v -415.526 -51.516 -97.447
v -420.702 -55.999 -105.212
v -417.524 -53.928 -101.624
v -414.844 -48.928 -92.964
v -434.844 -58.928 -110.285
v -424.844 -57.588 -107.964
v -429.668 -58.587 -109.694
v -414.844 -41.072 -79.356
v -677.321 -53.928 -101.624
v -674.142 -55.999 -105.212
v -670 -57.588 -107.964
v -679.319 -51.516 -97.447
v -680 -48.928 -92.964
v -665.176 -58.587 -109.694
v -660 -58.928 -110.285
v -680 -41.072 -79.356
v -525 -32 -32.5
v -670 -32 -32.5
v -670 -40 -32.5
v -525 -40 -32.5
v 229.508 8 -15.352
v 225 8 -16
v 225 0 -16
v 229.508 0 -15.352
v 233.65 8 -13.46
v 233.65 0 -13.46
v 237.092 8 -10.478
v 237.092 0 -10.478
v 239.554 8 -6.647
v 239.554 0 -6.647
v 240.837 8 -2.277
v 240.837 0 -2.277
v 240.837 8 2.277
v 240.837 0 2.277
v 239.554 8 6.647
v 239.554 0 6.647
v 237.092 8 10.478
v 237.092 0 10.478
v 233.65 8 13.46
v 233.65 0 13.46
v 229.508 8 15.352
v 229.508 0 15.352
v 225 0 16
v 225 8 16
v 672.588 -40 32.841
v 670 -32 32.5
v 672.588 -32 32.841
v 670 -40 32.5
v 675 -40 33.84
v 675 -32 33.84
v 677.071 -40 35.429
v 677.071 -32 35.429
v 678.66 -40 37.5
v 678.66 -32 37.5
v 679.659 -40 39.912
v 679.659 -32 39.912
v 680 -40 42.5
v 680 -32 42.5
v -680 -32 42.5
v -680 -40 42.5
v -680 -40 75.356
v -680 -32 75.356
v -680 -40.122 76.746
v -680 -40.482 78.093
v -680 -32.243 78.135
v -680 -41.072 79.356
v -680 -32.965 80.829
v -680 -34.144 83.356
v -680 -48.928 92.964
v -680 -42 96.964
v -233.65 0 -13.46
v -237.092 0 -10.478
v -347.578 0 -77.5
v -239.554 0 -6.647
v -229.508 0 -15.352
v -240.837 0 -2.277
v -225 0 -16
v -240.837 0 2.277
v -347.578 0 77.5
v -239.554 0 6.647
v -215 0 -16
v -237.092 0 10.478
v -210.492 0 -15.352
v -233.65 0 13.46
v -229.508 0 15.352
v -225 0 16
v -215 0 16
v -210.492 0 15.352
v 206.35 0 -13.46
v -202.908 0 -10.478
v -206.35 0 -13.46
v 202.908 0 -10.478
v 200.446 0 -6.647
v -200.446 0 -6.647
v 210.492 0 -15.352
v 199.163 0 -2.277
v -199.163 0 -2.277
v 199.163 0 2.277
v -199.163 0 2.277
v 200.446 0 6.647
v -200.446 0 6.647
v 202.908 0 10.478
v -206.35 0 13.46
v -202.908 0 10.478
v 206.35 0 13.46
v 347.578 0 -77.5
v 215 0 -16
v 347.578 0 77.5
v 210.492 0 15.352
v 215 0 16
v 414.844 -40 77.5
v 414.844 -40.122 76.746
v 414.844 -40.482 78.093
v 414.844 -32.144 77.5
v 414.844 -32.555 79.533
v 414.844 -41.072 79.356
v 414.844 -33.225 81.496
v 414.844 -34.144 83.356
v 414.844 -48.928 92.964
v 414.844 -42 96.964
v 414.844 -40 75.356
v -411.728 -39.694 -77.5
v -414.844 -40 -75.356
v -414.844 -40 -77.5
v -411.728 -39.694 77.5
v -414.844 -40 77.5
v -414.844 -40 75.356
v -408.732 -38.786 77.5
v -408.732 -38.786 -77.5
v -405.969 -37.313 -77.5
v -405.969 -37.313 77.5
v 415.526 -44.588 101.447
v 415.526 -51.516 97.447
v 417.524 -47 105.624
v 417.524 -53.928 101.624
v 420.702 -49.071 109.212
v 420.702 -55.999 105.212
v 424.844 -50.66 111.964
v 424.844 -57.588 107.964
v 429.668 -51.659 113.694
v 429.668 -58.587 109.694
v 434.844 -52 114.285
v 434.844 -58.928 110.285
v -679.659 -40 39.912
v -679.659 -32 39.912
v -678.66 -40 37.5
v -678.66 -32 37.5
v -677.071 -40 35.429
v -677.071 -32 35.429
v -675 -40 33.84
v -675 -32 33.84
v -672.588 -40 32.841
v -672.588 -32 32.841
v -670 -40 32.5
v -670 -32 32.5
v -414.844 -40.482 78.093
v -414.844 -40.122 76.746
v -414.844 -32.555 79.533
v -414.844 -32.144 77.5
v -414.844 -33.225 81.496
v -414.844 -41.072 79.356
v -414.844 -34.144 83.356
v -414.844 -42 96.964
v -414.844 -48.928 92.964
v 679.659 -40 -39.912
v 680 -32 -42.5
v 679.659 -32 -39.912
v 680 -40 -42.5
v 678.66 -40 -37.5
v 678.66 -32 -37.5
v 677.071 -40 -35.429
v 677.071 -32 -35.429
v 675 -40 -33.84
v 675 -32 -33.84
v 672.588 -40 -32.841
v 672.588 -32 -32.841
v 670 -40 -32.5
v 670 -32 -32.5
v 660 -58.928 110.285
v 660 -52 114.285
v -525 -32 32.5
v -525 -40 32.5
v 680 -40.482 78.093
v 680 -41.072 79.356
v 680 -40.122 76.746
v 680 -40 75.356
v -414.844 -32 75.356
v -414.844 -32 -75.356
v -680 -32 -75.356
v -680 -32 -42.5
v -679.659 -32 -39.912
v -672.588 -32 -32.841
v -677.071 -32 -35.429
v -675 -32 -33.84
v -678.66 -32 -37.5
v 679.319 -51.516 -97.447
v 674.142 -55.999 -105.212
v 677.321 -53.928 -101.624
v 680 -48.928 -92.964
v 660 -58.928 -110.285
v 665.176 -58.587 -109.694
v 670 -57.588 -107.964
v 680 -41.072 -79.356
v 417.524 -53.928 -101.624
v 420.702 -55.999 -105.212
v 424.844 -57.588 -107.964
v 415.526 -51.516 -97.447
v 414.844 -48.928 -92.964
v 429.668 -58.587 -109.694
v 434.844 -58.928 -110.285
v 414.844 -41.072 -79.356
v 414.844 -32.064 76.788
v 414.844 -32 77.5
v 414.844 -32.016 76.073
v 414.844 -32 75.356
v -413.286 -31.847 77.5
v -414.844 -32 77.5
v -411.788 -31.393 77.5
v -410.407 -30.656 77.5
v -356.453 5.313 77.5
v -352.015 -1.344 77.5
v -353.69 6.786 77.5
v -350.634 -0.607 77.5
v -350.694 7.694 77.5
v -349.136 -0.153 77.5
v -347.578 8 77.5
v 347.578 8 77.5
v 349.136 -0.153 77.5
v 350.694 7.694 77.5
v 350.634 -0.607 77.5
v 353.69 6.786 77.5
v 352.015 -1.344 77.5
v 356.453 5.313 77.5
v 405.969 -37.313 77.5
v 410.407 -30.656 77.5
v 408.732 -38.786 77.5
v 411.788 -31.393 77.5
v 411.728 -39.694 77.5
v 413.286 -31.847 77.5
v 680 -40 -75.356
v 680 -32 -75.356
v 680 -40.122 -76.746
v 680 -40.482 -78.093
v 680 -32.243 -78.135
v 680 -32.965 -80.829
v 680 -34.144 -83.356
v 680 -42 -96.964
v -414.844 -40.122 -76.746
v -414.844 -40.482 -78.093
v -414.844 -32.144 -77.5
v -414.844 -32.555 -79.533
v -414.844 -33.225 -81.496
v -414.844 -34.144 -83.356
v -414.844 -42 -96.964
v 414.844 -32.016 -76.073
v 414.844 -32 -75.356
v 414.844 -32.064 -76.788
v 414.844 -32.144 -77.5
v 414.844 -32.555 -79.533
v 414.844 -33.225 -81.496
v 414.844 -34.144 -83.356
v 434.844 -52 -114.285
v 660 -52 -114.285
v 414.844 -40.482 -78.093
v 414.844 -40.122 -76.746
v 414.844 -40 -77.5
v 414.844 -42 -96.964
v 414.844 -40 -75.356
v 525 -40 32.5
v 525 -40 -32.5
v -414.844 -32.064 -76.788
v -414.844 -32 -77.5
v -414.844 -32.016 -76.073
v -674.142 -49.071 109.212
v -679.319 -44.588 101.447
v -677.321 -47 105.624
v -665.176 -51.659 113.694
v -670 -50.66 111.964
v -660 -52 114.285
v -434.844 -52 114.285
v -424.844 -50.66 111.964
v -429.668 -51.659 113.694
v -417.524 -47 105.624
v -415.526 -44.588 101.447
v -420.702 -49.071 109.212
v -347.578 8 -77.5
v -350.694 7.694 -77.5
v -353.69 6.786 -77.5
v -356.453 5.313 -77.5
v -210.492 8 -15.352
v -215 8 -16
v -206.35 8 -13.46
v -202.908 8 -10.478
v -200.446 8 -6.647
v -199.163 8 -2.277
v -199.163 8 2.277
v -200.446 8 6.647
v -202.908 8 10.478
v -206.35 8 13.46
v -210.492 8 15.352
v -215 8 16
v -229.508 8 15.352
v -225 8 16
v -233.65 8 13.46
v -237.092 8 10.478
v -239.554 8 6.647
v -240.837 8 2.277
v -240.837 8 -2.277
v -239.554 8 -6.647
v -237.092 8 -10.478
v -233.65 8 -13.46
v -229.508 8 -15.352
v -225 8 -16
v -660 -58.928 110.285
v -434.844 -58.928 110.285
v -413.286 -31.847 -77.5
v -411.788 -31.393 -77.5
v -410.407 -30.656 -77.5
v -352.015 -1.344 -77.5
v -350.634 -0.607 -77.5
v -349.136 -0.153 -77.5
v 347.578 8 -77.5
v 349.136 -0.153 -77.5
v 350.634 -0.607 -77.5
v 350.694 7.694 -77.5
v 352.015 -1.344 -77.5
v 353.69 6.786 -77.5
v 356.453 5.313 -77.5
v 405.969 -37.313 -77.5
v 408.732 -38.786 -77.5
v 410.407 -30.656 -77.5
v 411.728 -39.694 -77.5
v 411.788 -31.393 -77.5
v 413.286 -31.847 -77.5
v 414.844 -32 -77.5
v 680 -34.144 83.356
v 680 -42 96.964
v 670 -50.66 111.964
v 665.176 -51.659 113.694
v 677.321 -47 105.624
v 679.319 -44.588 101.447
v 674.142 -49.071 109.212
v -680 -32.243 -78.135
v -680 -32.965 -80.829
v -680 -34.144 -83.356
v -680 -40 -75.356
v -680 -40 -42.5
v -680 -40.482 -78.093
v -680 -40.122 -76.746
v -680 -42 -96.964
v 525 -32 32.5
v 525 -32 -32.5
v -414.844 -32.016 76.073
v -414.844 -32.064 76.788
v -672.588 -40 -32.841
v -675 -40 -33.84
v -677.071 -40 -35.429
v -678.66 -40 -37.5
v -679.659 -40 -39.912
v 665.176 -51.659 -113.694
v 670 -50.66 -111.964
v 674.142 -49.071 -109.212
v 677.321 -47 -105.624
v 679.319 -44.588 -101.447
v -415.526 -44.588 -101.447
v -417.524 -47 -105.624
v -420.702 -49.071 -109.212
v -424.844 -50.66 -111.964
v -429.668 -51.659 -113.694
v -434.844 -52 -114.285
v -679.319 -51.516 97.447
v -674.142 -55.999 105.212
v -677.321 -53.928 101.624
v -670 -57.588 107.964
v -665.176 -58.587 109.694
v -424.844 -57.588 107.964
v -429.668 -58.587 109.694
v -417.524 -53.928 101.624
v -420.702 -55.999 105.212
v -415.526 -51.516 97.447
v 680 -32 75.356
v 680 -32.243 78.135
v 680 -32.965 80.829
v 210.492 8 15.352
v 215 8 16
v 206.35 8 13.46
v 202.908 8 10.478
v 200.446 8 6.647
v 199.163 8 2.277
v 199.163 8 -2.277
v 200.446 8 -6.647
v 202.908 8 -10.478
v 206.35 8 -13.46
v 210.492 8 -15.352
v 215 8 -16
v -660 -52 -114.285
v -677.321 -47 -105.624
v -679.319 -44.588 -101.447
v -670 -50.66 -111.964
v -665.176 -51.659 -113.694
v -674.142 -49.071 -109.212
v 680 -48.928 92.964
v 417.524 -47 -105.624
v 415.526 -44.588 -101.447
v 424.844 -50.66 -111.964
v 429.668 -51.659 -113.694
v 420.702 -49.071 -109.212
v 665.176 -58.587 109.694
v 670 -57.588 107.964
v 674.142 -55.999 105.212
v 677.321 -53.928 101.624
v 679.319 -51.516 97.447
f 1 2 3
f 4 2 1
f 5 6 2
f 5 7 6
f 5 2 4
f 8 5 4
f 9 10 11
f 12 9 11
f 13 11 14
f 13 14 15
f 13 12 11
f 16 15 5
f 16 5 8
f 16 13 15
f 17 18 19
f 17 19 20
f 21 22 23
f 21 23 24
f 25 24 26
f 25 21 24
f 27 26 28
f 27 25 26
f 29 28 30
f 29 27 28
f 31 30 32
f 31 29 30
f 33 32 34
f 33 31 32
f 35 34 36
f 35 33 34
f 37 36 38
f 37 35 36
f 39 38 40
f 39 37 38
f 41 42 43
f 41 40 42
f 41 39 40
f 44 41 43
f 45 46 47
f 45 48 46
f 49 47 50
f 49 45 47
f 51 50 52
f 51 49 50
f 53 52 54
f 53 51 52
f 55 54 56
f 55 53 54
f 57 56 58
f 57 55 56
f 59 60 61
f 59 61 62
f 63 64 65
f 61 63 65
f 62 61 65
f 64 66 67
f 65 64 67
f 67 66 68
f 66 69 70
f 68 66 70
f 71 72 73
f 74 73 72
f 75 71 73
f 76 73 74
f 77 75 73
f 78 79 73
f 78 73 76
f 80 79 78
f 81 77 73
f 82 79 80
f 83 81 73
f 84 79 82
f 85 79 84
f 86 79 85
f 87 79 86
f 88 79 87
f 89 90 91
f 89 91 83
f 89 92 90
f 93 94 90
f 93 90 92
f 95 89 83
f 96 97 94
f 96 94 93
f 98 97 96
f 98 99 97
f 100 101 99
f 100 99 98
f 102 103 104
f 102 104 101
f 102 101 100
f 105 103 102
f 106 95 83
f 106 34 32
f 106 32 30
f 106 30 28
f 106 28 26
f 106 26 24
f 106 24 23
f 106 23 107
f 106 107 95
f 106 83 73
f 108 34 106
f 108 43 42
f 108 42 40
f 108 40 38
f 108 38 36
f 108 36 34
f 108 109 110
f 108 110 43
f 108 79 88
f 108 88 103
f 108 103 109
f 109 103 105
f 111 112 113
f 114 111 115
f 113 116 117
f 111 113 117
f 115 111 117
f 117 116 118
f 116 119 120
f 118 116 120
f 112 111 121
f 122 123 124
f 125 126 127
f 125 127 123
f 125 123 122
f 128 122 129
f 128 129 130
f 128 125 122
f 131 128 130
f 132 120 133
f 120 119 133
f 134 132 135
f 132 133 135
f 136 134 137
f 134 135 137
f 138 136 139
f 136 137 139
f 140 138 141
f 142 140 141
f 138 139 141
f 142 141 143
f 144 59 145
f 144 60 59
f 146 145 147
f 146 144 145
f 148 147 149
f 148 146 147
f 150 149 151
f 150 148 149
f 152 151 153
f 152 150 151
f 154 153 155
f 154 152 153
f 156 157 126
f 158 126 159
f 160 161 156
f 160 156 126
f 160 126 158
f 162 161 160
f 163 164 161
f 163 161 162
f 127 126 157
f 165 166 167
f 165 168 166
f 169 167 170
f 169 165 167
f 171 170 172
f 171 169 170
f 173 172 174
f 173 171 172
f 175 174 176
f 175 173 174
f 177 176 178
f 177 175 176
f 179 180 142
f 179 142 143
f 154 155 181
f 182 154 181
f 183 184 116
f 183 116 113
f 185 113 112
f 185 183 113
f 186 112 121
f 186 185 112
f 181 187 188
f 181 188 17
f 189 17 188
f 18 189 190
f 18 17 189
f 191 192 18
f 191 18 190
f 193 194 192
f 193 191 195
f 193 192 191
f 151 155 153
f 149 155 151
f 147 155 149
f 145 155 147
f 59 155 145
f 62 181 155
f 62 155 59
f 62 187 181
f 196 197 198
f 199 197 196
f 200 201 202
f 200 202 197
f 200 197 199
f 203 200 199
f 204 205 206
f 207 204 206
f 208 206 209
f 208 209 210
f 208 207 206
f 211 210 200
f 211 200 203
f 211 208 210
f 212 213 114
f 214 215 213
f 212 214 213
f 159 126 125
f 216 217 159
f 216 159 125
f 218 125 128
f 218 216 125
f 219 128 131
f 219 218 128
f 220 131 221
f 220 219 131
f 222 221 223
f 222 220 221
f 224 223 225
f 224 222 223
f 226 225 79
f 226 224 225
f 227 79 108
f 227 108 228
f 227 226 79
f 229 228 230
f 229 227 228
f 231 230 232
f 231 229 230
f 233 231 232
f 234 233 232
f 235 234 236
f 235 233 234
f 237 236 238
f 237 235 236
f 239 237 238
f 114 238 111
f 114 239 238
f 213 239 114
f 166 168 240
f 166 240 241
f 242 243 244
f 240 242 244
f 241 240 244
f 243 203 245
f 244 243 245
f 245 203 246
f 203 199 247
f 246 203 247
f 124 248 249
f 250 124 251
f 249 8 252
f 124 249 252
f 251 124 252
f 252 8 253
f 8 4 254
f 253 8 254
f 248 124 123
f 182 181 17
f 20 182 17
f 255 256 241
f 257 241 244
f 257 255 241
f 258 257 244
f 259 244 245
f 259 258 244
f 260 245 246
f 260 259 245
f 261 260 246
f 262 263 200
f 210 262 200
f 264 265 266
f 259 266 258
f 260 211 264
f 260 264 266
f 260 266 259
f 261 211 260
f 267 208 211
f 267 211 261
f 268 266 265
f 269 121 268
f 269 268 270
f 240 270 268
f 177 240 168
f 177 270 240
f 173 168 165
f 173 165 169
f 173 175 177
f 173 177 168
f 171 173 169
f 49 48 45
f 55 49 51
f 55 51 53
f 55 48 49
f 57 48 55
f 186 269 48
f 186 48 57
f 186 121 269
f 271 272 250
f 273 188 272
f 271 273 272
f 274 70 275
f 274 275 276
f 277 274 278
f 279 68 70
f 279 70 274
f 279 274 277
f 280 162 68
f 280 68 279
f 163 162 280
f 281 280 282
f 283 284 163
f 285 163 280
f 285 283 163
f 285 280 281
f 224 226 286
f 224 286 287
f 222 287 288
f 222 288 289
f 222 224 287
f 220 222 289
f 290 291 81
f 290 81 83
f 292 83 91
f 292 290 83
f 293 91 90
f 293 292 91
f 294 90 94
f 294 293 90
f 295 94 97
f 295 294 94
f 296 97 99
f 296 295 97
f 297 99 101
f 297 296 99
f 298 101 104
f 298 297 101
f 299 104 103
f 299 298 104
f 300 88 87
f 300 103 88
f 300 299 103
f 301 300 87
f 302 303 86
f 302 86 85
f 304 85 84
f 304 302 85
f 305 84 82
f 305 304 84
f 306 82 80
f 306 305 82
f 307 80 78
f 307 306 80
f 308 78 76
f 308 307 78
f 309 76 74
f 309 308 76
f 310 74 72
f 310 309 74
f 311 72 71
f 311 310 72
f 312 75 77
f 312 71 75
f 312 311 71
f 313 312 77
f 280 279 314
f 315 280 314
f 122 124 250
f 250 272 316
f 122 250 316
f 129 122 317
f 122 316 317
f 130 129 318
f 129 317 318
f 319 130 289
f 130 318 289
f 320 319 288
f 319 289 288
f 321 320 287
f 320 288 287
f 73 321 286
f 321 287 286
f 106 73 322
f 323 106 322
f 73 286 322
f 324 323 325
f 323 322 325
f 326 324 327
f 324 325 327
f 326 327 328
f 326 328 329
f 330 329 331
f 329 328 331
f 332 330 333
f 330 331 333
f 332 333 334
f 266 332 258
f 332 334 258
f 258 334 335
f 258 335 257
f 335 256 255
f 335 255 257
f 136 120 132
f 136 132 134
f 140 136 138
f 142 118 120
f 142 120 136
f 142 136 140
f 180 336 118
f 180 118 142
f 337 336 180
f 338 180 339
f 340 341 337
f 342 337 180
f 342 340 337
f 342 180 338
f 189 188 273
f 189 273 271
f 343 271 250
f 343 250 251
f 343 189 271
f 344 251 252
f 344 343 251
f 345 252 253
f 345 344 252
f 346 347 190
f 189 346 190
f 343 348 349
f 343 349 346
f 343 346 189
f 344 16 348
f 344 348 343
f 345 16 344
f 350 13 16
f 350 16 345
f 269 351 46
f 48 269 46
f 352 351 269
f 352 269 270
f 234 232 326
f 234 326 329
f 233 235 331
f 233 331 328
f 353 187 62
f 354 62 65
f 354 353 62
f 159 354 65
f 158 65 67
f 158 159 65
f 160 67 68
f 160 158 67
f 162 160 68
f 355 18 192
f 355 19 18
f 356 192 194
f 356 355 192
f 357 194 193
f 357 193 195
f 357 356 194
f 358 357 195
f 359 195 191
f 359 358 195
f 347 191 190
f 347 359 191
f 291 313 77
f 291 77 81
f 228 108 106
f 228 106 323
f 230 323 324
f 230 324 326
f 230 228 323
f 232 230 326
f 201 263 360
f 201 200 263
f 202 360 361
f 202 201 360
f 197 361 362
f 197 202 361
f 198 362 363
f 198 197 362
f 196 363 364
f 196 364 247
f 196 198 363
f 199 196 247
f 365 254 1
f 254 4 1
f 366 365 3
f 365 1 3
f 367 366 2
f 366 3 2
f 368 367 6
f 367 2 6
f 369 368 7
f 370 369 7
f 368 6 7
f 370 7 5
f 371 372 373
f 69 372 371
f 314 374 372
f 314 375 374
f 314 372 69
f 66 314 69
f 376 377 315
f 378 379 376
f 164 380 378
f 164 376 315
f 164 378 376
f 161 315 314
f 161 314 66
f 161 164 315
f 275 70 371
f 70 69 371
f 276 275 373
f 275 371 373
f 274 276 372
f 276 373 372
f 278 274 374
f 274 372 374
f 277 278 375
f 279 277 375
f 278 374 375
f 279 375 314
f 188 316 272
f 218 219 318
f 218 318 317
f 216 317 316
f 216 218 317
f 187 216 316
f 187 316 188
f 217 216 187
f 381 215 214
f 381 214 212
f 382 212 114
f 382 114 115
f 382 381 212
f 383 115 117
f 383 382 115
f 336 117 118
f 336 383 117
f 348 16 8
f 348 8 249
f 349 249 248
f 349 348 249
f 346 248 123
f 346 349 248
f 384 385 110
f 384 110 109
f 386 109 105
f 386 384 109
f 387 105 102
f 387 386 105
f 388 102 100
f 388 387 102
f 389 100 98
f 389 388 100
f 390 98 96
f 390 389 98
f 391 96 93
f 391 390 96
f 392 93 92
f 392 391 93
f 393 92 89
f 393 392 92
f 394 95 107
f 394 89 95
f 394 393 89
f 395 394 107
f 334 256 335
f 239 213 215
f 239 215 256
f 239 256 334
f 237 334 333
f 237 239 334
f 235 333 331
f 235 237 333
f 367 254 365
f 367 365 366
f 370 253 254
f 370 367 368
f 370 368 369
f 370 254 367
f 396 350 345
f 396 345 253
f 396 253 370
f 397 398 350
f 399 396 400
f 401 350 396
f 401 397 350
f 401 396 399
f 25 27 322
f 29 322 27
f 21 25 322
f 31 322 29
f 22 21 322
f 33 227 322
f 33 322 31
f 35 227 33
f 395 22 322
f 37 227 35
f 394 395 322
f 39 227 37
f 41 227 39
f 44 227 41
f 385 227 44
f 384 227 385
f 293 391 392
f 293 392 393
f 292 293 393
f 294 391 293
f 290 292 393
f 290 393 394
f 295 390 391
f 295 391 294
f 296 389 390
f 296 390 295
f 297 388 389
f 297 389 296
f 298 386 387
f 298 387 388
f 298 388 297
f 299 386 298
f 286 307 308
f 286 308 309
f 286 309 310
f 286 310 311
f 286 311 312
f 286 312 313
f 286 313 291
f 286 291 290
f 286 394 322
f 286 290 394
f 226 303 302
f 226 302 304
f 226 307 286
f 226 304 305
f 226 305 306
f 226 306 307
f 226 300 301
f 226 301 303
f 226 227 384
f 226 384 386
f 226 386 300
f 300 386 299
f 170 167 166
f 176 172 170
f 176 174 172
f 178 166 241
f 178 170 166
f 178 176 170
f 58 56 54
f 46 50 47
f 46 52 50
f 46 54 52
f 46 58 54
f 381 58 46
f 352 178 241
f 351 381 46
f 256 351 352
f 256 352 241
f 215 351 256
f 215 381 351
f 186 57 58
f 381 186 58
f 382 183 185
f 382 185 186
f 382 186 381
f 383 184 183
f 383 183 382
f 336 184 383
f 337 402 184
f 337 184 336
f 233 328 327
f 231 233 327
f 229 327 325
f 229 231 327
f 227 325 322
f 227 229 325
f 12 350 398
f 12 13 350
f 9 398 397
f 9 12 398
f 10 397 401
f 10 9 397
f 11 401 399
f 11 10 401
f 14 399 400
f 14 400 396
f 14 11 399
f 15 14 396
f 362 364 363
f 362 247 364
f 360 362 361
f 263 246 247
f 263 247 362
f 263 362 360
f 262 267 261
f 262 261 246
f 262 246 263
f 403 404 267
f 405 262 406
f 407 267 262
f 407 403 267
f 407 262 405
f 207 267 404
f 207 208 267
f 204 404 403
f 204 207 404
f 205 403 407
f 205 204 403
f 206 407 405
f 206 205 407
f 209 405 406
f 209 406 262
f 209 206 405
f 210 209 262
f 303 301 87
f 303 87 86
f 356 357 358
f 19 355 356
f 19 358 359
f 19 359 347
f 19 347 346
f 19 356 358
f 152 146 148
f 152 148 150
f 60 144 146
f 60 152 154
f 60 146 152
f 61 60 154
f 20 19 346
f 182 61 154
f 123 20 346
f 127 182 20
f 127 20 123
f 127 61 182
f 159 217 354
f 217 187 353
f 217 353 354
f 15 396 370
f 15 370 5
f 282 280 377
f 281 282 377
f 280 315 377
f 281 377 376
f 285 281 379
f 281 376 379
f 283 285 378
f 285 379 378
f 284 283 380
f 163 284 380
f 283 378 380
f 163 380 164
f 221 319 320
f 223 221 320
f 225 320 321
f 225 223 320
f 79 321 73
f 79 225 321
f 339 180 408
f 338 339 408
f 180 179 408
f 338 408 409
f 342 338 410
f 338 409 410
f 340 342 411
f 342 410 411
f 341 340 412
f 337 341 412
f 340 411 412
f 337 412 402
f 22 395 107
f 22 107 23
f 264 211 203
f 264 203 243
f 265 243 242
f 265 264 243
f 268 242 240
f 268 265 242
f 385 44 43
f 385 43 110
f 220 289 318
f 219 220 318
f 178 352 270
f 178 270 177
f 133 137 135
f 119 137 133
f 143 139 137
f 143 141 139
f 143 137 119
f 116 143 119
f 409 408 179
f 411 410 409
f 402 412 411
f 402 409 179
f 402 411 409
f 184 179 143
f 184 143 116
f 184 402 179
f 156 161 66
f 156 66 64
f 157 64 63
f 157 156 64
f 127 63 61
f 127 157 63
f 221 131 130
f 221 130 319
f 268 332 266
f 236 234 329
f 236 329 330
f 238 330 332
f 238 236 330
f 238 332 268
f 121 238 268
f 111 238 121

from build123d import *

# Parameters (mm, degrees)
SM_BASE_FLANGE_1_DEPTH             = 77.5
SKETCH_6_W                         = 155
SKETCH_6_H                         = 65
CUT_EXTRUDE_1_DEPTH                = 687.083267541
CUT_EXTRUDE_2_DEPTH                = 687.083267541
SM_EDGE_FLANGE_2_STRIP_CUT_DEPTH   = 265.155589796
SM_EDGE_FLANGE_2_STRIP_CUT_2_DEPTH = 265.155589796
SM_EDGE_FLANGE_2_STRIP_CUT_3_DEPTH = 265.155589796
SM_EDGE_FLANGE_2_STRIP_CUT_4_DEPTH = 265.155589796
SM_EDGE_FLANGE_2_DEPTH             = 265.155589796
SM_EDGE_FLANGE_2_BEND_DEPTH        = 265.155589796
SM_EDGE_FLANGE_2_BEND_2_DEPTH      = 265.155589796
SM_EDGE_FLANGE_2_BEND_3_DEPTH      = 265.155589796
FILLET_1_R                         = 10
FILLET_2_R                         = 20


# Sheet-metal steps are written as plain solids
with BuildPart() as part:
    # Sketch 1 → 基体-法兰1 (new, symmetric)
    with BuildSketch(Plane.XY):
        with BuildLine():
            Line((-680, -40), (-414.844410204, -40))
            ThreePointArc((-414.844410204, -40), (-410.207863825, -39.313472424), (-405.969207064, -37.312804709))
            Line((-405.969207064, -37.312804709), (-352.015396468, -1.343597645))
            ThreePointArc((-352.015396468, -1.343597645), (-349.896068088, -0.343263788), (-347.577794898, 0))
            Line((-347.577794898, 0), (347.577794898, 0))
            ThreePointArc((347.577794898, 0), (349.896068088, -0.343263788), (352.015396468, -1.343597645))
            Line((352.015396468, -1.343597645), (405.969207064, -37.312804709))
            ThreePointArc((405.969207064, -37.312804709), (410.207863825, -39.313472424), (414.844410204, -40))
            Line((414.844410204, -40), (680, -40))
            Line((680, -40), (680, -32))
            Line((680, -32), (414.844410204, -32))
            ThreePointArc((414.844410204, -32), (412.526137014, -31.656736212), (410.406808634, -30.656402355))
            Line((410.406808634, -30.656402355), (356.452998038, 5.312804709))
            ThreePointArc((356.452998038, 5.312804709), (352.214341277, 7.313472424), (347.577794898, 8))
            Line((347.577794898, 8), (-347.577794898, 8))
            ThreePointArc((-347.577794898, 8), (-352.214341277, 7.313472424), (-356.452998038, 5.312804709))
            Line((-356.452998038, 5.312804709), (-410.406808634, -30.656402355))
            ThreePointArc((-410.406808634, -30.656402355), (-412.526137014, -31.656736212), (-414.844410204, -32))
            Line((-414.844410204, -32), (-680, -32))
            Line((-680, -32), (-680, -40))
        make_face()
    extrude(amount=SM_BASE_FLANGE_1_DEPTH, both=True)

    # 草图6 → 切除-拉伸1 (cut, through all)
    with BuildSketch(Plane(origin=(0, 8, 0), x_dir=(1, 0, 0), z_dir=(0, 1, 0))):
        with Locations((-602.5, 0)):
            Rectangle(SKETCH_6_W, SKETCH_6_H)
        with Locations((602.5, 0)):
            Rectangle(SKETCH_6_W, SKETCH_6_H)
    extrude(amount=-CUT_EXTRUDE_1_DEPTH, mode=Mode.SUBTRACT)

    # 草图7 → 切除-拉伸2 (cut, through all)
    with BuildSketch(Plane(origin=(0, 8, 0), x_dir=(1, 0, 0), z_dir=(0, 1, 0))):
        with BuildLine():
            Line((-225, 16), (-215, 16))
            ThreePointArc((-215, 16), (-199, 0), (-215, -16))
            Line((-215, -16), (-225, -16))
            ThreePointArc((-225, -16), (-241, 0), (-225, 16))
        make_face()
        with BuildLine():
            Line((215, 16), (225, 16))
            ThreePointArc((225, 16), (241, 0), (225, -16))
            Line((225, -16), (215, -16))
            ThreePointArc((215, -16), (199, 0), (215, 16))
        make_face()
    extrude(amount=-CUT_EXTRUDE_2_DEPTH, mode=Mode.SUBTRACT)

    # 边线-法兰2 strip (across the edge) → 边线-法兰2 strip cut (cut)
    with BuildSketch(Plane(origin=(-680, -40, -77.5), x_dir=(0, -0.8660254037844416, 0.49999999999999495), z_dir=(1, 0, 0))):
        Polygon((-29.856406461, 35.712812921), (-5.856406461, -5.856406461), (1.07179677, -1.856406461), (-22.92820323, 39.712812921), align=None)
    extrude(amount=SM_EDGE_FLANGE_2_STRIP_CUT_DEPTH, mode=Mode.SUBTRACT)

    # 边线-法兰2 strip 2 (across the edge) → 边线-法兰2 strip cut 2 (cut)
    with BuildSketch(Plane(origin=(680, -40, 77.5), x_dir=(0, -0.8660254037844416, -0.49999999999999495), z_dir=(-1, 0, 0))):
        Polygon((-29.856406461, 35.712812921), (-5.856406461, -5.856406461), (1.07179677, -1.856406461), (-22.92820323, 39.712812921), align=None)
    extrude(amount=SM_EDGE_FLANGE_2_STRIP_CUT_2_DEPTH, mode=Mode.SUBTRACT)

    # 边线-法兰2 strip 3 (across the edge) → 边线-法兰2 strip cut 3 (cut)
    with BuildSketch(Plane(origin=(414.844410204, -40, -77.5), x_dir=(0, -0.8660254037844416, 0.49999999999999495), z_dir=(1, 0, 0))):
        Polygon((-29.856406461, 35.712812921), (-5.856406461, -5.856406461), (1.07179677, -1.856406461), (-22.92820323, 39.712812921), align=None)
    extrude(amount=SM_EDGE_FLANGE_2_STRIP_CUT_3_DEPTH, mode=Mode.SUBTRACT)

    # 边线-法兰2 strip 4 (across the edge) → 边线-法兰2 strip cut 4 (cut)
    with BuildSketch(Plane(origin=(-414.844410204, -40, 77.5), x_dir=(0, -0.8660254037844416, -0.49999999999999495), z_dir=(-1, 0, 0))):
        Polygon((-29.856406461, 35.712812921), (-5.856406461, -5.856406461), (1.07179677, -1.856406461), (-22.92820323, 39.712812921), align=None)
    extrude(amount=SM_EDGE_FLANGE_2_STRIP_CUT_4_DEPTH, mode=Mode.SUBTRACT)

    # 边线-法兰2 section (across the edge) → 边线-法兰2 (add)
    with BuildSketch(Plane(origin=(-680, -40, -77.5), x_dir=(0, -0.8660254037844416, 0.49999999999999495), z_dir=(1, 0, 0))):
        with BuildLine():
            Line((-8, 2.143593539), (-8, 37.856406461))
            Line((-8, 37.856406461), (0, 37.856406461))
            Line((0, 37.856406461), (0, 2.143593539))
            ThreePointArc((0, 2.143593539), (0.27259339, 0.073041179), (1.07179677, -1.856406461))
            Line((1.07179677, -1.856406461), (-5.856406461, -5.856406461))
            ThreePointArc((-5.856406461, -5.856406461), (-7.454813221, -1.997511182), (-8, 2.143593539))
        make_face()
    extrude(amount=SM_EDGE_FLANGE_2_DEPTH)

    # 边线-法兰2 section 2 (across the edge) → 边线-法兰2 bend (add)
    with BuildSketch(Plane(origin=(680, -40, 77.5), x_dir=(0, -0.8660254037844416, -0.49999999999999495), z_dir=(-1, 0, 0))):
        with BuildLine():
            Line((-8, 2.143593539), (-8, 37.856406461))
            Line((-8, 37.856406461), (0, 37.856406461))
            Line((0, 37.856406461), (0, 2.143593539))
            ThreePointArc((0, 2.143593539), (0.27259339, 0.073041179), (1.07179677, -1.856406461))
            Line((1.07179677, -1.856406461), (-5.856406461, -5.856406461))
            ThreePointArc((-5.856406461, -5.856406461), (-7.454813221, -1.997511182), (-8, 2.143593539))
        make_face()
    extrude(amount=SM_EDGE_FLANGE_2_BEND_DEPTH)

    # 边线-法兰2 section 3 (across the edge) → 边线-法兰2 bend 2 (add)
    with BuildSketch(Plane(origin=(414.844410204, -40, -77.5), x_dir=(0, -0.8660254037844416, 0.49999999999999495), z_dir=(1, 0, 0))):
        with BuildLine():
            Line((-8, 2.143593539), (-8, 37.856406461))
            Line((-8, 37.856406461), (0, 37.856406461))
            Line((0, 37.856406461), (0, 2.143593539))
            ThreePointArc((0, 2.143593539), (0.27259339, 0.073041179), (1.07179677, -1.856406461))
            Line((1.07179677, -1.856406461), (-5.856406461, -5.856406461))
            ThreePointArc((-5.856406461, -5.856406461), (-7.454813221, -1.997511182), (-8, 2.143593539))
        make_face()
    extrude(amount=SM_EDGE_FLANGE_2_BEND_2_DEPTH)

    # 边线-法兰2 section 4 (across the edge) → 边线-法兰2 bend 3 (add)
    with BuildSketch(Plane(origin=(-414.844410204, -40, 77.5), x_dir=(0, -0.8660254037844416, -0.49999999999999495), z_dir=(-1, 0, 0))):
        with BuildLine():
            Line((-8, 2.143593539), (-8, 37.856406461))
            Line((-8, 37.856406461), (0, 37.856406461))
            Line((0, 37.856406461), (0, 2.143593539))
            ThreePointArc((0, 2.143593539), (0.27259339, 0.073041179), (1.07179677, -1.856406461))
            Line((1.07179677, -1.856406461), (-5.856406461, -5.856406461))
            ThreePointArc((-5.856406461, -5.856406461), (-7.454813221, -1.997511182), (-8, 2.143593539))
        make_face()
    extrude(amount=SM_EDGE_FLANGE_2_BEND_3_DEPTH)

    # 圆角1
    fillet_1_edges = [part.edges().sort_by_distance(p)[0] for p in [
        (-680, -36, 32.5),
        (-680, -36, -32.5),
        (680, -36, -32.5),
        (680, -36, 32.5),
    ]]
    fillet(fillet_1_edges, radius=FILLET_1_R)

    # 圆角2
    fillet_2_edges = [part.edges().sort_by_distance(p)[0] for p in [
        (-680, -55.464101615, -112.284609691),
        (-414.844410204, -55.464101615, -112.284609691),
        (680, -55.464101615, 112.284609691),
        (414.844410204, -55.464101615, 112.284609691),
        (414.844410204, -55.464101615, -112.284609691),
        (680, -55.464101615, -112.284609691),
        (-414.844410204, -55.464101615, 112.284609691),
        (-680, -55.464101615, 112.284609691),
    ]]
    fillet(fillet_2_edges, radius=FILLET_2_R)


solid = part.part
